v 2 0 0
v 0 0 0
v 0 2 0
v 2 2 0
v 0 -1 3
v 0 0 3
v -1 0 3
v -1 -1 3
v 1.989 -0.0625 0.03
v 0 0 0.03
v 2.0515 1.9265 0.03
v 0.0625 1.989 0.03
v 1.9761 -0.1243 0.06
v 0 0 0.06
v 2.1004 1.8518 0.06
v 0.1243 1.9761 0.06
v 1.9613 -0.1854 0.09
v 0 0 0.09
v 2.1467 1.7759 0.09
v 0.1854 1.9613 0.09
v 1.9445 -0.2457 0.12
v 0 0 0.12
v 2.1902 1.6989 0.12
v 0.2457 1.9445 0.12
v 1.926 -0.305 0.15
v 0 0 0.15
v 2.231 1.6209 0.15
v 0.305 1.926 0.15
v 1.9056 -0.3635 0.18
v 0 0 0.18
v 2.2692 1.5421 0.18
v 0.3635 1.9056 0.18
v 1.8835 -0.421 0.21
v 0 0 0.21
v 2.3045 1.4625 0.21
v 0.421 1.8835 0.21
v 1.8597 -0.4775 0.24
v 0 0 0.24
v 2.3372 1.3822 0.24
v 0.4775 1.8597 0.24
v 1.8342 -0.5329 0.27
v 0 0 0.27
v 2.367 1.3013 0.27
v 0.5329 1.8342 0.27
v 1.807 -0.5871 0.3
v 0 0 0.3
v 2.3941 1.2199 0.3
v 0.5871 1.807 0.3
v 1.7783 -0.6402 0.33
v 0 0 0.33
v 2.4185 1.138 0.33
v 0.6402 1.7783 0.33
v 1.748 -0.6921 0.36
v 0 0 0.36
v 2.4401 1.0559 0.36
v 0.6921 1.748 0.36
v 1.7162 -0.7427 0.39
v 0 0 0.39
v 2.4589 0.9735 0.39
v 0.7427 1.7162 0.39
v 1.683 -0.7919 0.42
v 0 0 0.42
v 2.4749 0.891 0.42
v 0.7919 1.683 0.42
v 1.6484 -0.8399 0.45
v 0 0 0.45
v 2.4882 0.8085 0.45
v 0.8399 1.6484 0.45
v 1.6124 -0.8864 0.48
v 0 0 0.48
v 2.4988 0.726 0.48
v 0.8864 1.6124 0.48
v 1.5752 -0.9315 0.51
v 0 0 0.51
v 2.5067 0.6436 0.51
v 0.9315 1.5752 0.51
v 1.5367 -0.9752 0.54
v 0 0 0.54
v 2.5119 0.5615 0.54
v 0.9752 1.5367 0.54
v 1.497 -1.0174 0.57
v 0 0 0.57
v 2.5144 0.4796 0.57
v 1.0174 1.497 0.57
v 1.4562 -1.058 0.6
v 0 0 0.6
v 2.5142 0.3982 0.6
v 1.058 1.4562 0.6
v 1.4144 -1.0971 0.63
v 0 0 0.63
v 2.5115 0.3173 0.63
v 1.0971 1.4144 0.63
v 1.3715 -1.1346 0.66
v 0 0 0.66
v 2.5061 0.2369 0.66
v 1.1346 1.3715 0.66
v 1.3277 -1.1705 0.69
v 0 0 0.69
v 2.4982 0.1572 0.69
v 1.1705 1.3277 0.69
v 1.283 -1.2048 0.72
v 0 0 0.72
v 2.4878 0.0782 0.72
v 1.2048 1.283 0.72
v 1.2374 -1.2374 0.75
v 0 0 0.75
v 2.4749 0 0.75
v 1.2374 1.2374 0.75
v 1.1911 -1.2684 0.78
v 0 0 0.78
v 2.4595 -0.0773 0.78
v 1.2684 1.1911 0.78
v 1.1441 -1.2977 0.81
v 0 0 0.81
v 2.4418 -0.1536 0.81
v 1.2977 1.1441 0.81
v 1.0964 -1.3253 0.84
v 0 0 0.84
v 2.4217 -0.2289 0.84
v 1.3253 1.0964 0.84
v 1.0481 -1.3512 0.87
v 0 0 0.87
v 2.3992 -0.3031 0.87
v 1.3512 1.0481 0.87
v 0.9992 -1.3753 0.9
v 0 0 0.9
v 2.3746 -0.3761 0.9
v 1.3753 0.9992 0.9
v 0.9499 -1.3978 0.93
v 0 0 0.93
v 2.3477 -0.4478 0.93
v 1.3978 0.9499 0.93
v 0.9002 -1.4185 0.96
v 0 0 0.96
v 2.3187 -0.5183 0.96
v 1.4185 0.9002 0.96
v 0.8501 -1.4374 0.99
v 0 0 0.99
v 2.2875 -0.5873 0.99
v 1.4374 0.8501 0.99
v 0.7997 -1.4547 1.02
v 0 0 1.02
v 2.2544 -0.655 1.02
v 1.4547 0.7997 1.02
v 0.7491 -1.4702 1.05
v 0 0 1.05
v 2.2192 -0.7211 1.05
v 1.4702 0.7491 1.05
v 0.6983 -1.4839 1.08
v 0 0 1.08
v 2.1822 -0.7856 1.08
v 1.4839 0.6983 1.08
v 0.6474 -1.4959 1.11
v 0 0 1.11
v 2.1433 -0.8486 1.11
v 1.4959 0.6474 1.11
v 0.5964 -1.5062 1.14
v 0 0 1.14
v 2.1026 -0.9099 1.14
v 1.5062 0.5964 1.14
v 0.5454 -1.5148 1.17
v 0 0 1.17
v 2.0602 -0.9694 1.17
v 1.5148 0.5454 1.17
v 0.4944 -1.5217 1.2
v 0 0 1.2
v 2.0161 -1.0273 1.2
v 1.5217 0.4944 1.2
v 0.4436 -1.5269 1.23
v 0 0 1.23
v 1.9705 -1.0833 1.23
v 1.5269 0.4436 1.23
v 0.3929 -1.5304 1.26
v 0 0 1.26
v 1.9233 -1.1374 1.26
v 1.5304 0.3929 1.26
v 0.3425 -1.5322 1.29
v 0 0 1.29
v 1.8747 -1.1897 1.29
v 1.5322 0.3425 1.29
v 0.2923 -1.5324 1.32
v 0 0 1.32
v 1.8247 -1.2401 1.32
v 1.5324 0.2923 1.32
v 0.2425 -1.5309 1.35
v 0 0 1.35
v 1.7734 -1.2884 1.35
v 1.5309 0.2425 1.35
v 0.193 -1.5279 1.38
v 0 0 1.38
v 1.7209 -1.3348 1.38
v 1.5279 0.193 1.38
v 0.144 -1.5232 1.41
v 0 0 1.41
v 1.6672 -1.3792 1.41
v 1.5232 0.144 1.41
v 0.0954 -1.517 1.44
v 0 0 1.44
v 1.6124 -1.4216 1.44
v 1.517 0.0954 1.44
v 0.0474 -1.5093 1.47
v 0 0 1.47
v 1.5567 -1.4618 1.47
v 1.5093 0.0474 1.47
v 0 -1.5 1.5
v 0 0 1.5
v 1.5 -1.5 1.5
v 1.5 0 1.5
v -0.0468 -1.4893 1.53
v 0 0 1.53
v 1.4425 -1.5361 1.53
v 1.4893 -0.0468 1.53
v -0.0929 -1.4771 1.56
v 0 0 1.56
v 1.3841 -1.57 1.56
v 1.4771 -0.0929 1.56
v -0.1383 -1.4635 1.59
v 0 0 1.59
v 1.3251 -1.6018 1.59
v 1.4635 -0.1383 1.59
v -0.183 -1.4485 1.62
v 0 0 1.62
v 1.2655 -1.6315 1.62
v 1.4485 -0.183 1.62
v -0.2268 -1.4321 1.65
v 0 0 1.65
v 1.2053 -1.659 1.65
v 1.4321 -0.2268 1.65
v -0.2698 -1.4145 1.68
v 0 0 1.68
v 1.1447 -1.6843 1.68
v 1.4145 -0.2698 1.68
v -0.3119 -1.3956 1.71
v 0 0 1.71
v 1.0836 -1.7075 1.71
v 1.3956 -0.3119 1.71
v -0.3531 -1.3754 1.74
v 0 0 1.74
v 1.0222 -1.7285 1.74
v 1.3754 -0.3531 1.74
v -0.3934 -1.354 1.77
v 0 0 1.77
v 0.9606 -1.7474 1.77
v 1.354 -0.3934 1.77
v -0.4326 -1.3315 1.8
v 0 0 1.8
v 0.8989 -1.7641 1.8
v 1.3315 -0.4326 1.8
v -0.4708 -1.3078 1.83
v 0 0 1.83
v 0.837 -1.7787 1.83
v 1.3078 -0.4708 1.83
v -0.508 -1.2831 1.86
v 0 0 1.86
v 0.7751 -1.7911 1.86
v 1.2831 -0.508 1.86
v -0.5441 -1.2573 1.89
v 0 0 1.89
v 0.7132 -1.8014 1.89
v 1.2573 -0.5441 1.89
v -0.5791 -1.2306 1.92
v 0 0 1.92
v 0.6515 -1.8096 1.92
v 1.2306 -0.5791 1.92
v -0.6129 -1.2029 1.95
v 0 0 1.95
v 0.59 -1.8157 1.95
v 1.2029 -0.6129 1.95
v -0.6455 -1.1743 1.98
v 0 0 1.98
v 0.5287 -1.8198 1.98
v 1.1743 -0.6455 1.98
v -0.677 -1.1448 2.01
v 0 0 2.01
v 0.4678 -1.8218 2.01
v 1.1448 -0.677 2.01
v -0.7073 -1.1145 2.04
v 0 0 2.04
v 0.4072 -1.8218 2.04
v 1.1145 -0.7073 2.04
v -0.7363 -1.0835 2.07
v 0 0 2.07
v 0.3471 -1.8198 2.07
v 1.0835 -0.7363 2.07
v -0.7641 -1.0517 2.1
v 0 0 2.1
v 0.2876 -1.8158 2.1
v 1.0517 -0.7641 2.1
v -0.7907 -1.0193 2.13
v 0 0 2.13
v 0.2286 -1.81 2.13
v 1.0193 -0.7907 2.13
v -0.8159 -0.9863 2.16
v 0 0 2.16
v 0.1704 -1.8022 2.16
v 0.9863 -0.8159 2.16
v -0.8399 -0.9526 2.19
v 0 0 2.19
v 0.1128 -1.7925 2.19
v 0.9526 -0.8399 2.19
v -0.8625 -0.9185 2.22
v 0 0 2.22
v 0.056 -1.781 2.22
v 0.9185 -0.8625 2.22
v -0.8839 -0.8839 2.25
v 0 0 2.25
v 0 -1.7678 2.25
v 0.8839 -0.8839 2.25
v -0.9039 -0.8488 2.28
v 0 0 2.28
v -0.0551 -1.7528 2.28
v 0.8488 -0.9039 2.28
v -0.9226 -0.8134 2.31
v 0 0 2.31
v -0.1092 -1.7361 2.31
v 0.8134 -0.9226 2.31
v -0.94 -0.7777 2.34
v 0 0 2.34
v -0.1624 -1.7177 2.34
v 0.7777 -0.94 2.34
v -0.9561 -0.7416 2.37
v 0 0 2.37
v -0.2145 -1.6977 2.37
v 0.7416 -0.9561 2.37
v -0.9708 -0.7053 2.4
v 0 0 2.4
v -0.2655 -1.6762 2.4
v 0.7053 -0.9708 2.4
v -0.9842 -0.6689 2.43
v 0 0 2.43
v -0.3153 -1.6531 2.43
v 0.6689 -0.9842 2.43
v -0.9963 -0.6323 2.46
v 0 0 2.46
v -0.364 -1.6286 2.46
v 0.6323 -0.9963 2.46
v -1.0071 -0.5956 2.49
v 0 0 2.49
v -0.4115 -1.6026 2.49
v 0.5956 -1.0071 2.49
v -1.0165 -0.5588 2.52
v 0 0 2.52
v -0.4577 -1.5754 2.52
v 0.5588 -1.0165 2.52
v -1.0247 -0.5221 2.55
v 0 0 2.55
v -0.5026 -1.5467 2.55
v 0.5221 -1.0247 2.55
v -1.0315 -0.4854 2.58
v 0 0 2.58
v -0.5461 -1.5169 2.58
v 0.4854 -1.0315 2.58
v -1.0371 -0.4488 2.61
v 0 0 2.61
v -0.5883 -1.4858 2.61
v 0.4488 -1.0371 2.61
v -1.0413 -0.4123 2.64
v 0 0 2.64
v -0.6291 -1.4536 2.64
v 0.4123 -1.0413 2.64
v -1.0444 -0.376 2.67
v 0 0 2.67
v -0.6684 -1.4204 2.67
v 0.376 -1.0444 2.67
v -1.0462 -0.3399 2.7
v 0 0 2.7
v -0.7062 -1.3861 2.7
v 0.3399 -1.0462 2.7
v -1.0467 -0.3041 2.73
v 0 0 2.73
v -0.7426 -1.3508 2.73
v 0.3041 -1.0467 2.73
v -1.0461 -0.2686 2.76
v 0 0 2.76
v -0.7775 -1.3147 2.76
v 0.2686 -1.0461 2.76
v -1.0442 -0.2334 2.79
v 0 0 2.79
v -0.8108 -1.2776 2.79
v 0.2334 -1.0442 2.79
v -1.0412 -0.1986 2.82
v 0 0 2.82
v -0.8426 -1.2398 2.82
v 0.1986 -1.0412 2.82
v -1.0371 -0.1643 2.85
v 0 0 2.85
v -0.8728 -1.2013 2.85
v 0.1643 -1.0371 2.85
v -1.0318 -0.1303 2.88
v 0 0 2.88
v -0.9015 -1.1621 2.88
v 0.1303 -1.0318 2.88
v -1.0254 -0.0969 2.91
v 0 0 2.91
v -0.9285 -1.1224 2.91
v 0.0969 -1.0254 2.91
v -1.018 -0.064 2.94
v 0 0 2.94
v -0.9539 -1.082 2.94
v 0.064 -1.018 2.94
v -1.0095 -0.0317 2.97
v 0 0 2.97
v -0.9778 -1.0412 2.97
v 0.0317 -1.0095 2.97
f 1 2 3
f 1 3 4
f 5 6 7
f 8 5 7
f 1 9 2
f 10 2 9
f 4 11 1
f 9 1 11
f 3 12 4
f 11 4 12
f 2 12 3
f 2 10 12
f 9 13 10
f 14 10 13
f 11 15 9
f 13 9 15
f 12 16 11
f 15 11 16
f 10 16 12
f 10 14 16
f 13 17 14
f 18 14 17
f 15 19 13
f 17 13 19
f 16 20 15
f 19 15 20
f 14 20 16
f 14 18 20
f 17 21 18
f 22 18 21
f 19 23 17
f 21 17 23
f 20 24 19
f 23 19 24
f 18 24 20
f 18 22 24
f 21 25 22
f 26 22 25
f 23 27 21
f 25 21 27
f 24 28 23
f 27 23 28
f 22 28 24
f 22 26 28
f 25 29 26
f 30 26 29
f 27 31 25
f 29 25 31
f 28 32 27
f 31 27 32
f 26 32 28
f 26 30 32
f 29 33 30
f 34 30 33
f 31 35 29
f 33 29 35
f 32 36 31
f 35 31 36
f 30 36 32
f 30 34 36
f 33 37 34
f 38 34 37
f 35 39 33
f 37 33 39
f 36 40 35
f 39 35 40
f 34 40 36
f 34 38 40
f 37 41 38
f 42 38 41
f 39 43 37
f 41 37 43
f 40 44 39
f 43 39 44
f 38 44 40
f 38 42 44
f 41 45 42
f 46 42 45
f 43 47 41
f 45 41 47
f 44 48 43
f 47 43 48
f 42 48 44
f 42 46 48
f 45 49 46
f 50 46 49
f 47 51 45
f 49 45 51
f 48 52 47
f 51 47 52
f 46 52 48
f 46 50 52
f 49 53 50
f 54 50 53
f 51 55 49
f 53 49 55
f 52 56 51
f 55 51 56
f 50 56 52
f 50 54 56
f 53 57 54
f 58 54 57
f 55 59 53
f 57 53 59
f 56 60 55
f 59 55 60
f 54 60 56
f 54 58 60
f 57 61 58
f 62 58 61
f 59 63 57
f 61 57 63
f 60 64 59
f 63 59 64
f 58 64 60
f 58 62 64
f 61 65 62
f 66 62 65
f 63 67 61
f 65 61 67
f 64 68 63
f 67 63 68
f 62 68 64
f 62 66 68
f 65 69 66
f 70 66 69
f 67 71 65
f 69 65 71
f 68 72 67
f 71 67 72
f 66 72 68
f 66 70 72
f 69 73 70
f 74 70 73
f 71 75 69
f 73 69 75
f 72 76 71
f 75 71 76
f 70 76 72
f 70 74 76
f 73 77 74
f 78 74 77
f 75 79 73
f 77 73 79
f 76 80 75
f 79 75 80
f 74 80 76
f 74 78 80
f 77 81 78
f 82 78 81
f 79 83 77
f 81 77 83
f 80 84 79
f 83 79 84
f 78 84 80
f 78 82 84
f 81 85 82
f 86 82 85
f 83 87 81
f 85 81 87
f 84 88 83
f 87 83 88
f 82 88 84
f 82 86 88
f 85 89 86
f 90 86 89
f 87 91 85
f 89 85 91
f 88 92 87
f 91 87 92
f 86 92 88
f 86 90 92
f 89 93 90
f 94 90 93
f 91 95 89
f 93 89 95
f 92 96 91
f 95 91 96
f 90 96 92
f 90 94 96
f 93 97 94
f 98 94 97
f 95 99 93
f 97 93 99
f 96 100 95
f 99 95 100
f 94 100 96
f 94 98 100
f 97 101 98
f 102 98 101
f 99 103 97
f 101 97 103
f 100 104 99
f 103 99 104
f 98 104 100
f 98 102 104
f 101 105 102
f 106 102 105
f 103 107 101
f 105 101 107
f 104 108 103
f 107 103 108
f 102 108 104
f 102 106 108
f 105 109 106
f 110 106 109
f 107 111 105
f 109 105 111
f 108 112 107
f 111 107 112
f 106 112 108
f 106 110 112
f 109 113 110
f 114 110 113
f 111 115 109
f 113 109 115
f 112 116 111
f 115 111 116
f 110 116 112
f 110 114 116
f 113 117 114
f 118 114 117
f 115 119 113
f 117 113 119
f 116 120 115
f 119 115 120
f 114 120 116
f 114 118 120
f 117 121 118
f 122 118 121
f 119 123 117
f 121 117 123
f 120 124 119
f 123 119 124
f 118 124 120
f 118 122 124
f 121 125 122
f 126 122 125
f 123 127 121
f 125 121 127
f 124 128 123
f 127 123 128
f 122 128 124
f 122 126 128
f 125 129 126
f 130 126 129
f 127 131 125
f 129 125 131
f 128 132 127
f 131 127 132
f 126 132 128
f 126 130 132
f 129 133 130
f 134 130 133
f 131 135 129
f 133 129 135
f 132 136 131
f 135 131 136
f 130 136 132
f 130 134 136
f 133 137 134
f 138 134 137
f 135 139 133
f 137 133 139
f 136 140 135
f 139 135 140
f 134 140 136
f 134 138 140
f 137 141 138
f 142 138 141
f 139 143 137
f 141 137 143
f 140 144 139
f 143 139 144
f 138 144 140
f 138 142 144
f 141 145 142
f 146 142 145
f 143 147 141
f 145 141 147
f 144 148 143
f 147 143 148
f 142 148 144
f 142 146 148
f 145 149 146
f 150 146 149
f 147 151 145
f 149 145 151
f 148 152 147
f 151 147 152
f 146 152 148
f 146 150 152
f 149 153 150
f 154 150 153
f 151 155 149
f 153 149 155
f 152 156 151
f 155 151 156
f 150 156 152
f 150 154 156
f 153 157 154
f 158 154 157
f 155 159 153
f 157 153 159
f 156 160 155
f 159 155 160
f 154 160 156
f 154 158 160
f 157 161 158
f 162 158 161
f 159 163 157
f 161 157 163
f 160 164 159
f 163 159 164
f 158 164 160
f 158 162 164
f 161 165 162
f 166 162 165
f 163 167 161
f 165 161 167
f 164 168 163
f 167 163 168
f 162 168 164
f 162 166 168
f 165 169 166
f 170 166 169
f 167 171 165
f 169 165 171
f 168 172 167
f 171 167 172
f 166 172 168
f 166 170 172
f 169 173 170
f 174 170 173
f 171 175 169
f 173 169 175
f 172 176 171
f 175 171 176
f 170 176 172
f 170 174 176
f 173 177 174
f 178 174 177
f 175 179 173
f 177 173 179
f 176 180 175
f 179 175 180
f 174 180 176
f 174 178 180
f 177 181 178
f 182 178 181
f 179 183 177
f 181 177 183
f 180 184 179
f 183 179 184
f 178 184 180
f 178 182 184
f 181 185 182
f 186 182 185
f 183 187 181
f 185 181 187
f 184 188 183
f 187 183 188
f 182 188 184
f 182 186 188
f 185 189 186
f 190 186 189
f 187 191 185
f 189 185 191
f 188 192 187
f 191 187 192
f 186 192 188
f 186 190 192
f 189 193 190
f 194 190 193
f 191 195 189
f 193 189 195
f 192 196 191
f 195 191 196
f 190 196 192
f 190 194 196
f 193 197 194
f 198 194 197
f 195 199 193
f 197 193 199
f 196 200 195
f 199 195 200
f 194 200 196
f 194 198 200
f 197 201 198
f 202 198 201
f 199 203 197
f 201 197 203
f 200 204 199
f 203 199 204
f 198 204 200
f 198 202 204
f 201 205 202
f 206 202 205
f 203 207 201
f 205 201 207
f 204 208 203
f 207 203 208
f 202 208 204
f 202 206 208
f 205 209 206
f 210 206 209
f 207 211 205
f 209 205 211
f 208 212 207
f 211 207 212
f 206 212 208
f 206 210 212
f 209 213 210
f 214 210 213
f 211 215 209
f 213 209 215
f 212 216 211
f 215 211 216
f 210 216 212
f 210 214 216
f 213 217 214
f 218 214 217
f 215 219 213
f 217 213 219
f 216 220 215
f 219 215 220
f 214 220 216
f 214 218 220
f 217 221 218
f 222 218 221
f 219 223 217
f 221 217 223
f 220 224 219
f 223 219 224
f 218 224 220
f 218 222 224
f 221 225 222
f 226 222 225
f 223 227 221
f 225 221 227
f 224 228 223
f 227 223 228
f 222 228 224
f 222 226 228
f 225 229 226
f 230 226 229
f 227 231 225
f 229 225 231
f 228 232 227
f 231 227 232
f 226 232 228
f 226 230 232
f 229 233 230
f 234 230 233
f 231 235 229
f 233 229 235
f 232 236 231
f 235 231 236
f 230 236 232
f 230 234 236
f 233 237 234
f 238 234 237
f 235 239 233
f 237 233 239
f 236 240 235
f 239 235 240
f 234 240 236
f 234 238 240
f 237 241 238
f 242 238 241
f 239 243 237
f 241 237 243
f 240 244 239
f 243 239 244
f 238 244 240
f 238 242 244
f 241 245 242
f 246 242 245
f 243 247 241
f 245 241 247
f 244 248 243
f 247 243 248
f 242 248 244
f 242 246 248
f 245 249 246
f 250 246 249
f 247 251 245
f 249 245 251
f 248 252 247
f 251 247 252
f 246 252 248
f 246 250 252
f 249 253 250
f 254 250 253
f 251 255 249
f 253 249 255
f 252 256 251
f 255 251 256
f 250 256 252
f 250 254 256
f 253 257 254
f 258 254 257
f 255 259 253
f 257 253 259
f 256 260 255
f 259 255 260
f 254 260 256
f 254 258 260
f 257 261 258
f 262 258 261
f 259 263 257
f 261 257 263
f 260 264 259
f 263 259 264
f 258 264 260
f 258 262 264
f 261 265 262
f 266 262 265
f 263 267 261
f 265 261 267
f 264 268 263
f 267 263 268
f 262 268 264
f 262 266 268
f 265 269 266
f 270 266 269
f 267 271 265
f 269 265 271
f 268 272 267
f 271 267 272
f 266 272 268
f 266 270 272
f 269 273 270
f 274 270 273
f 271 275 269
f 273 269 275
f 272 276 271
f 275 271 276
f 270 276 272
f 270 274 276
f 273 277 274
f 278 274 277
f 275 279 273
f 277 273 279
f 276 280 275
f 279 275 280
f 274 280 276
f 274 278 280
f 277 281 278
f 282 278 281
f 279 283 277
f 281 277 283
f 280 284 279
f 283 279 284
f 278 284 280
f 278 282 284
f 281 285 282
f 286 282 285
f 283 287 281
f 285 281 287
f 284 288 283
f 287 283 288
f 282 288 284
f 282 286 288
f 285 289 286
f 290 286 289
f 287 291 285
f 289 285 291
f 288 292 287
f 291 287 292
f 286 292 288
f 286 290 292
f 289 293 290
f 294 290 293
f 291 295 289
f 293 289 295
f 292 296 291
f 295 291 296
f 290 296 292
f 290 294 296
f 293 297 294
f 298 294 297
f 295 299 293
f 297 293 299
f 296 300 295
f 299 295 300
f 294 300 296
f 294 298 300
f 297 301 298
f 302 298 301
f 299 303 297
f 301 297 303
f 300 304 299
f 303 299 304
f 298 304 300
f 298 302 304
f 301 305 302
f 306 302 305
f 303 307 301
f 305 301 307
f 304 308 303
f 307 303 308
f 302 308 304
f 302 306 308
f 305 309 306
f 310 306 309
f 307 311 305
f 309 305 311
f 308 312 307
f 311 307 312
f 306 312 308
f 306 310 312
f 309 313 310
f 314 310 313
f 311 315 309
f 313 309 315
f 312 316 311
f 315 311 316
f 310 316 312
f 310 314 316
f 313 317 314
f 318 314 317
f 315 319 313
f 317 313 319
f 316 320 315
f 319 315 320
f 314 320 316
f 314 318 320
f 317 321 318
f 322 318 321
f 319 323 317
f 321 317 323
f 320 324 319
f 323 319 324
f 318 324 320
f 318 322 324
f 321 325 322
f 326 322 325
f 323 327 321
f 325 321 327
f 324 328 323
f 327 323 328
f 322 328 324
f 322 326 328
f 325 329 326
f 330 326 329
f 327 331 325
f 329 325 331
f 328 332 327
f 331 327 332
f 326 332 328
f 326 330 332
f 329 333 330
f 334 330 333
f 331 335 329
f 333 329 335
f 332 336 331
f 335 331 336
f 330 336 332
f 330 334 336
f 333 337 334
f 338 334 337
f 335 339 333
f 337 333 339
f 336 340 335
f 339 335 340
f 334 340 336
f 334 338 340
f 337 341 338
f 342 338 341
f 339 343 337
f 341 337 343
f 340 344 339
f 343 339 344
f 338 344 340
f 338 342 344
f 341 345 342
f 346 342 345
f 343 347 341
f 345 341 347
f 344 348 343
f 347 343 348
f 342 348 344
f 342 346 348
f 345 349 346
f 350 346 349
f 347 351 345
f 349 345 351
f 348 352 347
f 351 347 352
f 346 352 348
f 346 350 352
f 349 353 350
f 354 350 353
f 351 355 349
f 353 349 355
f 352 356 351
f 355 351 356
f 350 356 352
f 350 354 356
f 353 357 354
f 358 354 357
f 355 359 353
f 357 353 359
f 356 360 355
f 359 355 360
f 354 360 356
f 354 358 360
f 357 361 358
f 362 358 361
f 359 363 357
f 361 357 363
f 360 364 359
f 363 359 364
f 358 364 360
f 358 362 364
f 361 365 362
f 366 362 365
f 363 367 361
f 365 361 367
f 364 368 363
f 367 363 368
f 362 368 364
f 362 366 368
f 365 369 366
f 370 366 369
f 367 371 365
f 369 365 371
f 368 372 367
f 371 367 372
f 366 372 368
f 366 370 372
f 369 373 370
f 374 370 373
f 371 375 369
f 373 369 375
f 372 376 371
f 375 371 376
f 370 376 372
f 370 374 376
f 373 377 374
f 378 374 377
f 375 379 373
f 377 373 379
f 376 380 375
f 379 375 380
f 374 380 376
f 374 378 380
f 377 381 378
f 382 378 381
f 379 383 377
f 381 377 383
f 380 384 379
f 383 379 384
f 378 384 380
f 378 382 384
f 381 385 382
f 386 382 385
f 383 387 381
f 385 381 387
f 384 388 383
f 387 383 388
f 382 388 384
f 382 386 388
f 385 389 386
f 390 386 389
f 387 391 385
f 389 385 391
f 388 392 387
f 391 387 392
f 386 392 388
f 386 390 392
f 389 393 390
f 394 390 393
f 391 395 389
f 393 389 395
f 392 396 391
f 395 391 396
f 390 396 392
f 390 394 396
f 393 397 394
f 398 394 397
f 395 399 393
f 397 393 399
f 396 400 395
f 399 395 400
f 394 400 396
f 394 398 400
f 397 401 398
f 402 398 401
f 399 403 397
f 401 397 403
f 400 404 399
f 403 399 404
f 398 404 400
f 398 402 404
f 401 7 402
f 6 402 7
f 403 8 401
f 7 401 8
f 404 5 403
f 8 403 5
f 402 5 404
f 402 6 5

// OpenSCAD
$fn=200;
linear_extrude(height=3, twist=180, scale=0.5, center=false)
square(size=[2, 2], center=false);
